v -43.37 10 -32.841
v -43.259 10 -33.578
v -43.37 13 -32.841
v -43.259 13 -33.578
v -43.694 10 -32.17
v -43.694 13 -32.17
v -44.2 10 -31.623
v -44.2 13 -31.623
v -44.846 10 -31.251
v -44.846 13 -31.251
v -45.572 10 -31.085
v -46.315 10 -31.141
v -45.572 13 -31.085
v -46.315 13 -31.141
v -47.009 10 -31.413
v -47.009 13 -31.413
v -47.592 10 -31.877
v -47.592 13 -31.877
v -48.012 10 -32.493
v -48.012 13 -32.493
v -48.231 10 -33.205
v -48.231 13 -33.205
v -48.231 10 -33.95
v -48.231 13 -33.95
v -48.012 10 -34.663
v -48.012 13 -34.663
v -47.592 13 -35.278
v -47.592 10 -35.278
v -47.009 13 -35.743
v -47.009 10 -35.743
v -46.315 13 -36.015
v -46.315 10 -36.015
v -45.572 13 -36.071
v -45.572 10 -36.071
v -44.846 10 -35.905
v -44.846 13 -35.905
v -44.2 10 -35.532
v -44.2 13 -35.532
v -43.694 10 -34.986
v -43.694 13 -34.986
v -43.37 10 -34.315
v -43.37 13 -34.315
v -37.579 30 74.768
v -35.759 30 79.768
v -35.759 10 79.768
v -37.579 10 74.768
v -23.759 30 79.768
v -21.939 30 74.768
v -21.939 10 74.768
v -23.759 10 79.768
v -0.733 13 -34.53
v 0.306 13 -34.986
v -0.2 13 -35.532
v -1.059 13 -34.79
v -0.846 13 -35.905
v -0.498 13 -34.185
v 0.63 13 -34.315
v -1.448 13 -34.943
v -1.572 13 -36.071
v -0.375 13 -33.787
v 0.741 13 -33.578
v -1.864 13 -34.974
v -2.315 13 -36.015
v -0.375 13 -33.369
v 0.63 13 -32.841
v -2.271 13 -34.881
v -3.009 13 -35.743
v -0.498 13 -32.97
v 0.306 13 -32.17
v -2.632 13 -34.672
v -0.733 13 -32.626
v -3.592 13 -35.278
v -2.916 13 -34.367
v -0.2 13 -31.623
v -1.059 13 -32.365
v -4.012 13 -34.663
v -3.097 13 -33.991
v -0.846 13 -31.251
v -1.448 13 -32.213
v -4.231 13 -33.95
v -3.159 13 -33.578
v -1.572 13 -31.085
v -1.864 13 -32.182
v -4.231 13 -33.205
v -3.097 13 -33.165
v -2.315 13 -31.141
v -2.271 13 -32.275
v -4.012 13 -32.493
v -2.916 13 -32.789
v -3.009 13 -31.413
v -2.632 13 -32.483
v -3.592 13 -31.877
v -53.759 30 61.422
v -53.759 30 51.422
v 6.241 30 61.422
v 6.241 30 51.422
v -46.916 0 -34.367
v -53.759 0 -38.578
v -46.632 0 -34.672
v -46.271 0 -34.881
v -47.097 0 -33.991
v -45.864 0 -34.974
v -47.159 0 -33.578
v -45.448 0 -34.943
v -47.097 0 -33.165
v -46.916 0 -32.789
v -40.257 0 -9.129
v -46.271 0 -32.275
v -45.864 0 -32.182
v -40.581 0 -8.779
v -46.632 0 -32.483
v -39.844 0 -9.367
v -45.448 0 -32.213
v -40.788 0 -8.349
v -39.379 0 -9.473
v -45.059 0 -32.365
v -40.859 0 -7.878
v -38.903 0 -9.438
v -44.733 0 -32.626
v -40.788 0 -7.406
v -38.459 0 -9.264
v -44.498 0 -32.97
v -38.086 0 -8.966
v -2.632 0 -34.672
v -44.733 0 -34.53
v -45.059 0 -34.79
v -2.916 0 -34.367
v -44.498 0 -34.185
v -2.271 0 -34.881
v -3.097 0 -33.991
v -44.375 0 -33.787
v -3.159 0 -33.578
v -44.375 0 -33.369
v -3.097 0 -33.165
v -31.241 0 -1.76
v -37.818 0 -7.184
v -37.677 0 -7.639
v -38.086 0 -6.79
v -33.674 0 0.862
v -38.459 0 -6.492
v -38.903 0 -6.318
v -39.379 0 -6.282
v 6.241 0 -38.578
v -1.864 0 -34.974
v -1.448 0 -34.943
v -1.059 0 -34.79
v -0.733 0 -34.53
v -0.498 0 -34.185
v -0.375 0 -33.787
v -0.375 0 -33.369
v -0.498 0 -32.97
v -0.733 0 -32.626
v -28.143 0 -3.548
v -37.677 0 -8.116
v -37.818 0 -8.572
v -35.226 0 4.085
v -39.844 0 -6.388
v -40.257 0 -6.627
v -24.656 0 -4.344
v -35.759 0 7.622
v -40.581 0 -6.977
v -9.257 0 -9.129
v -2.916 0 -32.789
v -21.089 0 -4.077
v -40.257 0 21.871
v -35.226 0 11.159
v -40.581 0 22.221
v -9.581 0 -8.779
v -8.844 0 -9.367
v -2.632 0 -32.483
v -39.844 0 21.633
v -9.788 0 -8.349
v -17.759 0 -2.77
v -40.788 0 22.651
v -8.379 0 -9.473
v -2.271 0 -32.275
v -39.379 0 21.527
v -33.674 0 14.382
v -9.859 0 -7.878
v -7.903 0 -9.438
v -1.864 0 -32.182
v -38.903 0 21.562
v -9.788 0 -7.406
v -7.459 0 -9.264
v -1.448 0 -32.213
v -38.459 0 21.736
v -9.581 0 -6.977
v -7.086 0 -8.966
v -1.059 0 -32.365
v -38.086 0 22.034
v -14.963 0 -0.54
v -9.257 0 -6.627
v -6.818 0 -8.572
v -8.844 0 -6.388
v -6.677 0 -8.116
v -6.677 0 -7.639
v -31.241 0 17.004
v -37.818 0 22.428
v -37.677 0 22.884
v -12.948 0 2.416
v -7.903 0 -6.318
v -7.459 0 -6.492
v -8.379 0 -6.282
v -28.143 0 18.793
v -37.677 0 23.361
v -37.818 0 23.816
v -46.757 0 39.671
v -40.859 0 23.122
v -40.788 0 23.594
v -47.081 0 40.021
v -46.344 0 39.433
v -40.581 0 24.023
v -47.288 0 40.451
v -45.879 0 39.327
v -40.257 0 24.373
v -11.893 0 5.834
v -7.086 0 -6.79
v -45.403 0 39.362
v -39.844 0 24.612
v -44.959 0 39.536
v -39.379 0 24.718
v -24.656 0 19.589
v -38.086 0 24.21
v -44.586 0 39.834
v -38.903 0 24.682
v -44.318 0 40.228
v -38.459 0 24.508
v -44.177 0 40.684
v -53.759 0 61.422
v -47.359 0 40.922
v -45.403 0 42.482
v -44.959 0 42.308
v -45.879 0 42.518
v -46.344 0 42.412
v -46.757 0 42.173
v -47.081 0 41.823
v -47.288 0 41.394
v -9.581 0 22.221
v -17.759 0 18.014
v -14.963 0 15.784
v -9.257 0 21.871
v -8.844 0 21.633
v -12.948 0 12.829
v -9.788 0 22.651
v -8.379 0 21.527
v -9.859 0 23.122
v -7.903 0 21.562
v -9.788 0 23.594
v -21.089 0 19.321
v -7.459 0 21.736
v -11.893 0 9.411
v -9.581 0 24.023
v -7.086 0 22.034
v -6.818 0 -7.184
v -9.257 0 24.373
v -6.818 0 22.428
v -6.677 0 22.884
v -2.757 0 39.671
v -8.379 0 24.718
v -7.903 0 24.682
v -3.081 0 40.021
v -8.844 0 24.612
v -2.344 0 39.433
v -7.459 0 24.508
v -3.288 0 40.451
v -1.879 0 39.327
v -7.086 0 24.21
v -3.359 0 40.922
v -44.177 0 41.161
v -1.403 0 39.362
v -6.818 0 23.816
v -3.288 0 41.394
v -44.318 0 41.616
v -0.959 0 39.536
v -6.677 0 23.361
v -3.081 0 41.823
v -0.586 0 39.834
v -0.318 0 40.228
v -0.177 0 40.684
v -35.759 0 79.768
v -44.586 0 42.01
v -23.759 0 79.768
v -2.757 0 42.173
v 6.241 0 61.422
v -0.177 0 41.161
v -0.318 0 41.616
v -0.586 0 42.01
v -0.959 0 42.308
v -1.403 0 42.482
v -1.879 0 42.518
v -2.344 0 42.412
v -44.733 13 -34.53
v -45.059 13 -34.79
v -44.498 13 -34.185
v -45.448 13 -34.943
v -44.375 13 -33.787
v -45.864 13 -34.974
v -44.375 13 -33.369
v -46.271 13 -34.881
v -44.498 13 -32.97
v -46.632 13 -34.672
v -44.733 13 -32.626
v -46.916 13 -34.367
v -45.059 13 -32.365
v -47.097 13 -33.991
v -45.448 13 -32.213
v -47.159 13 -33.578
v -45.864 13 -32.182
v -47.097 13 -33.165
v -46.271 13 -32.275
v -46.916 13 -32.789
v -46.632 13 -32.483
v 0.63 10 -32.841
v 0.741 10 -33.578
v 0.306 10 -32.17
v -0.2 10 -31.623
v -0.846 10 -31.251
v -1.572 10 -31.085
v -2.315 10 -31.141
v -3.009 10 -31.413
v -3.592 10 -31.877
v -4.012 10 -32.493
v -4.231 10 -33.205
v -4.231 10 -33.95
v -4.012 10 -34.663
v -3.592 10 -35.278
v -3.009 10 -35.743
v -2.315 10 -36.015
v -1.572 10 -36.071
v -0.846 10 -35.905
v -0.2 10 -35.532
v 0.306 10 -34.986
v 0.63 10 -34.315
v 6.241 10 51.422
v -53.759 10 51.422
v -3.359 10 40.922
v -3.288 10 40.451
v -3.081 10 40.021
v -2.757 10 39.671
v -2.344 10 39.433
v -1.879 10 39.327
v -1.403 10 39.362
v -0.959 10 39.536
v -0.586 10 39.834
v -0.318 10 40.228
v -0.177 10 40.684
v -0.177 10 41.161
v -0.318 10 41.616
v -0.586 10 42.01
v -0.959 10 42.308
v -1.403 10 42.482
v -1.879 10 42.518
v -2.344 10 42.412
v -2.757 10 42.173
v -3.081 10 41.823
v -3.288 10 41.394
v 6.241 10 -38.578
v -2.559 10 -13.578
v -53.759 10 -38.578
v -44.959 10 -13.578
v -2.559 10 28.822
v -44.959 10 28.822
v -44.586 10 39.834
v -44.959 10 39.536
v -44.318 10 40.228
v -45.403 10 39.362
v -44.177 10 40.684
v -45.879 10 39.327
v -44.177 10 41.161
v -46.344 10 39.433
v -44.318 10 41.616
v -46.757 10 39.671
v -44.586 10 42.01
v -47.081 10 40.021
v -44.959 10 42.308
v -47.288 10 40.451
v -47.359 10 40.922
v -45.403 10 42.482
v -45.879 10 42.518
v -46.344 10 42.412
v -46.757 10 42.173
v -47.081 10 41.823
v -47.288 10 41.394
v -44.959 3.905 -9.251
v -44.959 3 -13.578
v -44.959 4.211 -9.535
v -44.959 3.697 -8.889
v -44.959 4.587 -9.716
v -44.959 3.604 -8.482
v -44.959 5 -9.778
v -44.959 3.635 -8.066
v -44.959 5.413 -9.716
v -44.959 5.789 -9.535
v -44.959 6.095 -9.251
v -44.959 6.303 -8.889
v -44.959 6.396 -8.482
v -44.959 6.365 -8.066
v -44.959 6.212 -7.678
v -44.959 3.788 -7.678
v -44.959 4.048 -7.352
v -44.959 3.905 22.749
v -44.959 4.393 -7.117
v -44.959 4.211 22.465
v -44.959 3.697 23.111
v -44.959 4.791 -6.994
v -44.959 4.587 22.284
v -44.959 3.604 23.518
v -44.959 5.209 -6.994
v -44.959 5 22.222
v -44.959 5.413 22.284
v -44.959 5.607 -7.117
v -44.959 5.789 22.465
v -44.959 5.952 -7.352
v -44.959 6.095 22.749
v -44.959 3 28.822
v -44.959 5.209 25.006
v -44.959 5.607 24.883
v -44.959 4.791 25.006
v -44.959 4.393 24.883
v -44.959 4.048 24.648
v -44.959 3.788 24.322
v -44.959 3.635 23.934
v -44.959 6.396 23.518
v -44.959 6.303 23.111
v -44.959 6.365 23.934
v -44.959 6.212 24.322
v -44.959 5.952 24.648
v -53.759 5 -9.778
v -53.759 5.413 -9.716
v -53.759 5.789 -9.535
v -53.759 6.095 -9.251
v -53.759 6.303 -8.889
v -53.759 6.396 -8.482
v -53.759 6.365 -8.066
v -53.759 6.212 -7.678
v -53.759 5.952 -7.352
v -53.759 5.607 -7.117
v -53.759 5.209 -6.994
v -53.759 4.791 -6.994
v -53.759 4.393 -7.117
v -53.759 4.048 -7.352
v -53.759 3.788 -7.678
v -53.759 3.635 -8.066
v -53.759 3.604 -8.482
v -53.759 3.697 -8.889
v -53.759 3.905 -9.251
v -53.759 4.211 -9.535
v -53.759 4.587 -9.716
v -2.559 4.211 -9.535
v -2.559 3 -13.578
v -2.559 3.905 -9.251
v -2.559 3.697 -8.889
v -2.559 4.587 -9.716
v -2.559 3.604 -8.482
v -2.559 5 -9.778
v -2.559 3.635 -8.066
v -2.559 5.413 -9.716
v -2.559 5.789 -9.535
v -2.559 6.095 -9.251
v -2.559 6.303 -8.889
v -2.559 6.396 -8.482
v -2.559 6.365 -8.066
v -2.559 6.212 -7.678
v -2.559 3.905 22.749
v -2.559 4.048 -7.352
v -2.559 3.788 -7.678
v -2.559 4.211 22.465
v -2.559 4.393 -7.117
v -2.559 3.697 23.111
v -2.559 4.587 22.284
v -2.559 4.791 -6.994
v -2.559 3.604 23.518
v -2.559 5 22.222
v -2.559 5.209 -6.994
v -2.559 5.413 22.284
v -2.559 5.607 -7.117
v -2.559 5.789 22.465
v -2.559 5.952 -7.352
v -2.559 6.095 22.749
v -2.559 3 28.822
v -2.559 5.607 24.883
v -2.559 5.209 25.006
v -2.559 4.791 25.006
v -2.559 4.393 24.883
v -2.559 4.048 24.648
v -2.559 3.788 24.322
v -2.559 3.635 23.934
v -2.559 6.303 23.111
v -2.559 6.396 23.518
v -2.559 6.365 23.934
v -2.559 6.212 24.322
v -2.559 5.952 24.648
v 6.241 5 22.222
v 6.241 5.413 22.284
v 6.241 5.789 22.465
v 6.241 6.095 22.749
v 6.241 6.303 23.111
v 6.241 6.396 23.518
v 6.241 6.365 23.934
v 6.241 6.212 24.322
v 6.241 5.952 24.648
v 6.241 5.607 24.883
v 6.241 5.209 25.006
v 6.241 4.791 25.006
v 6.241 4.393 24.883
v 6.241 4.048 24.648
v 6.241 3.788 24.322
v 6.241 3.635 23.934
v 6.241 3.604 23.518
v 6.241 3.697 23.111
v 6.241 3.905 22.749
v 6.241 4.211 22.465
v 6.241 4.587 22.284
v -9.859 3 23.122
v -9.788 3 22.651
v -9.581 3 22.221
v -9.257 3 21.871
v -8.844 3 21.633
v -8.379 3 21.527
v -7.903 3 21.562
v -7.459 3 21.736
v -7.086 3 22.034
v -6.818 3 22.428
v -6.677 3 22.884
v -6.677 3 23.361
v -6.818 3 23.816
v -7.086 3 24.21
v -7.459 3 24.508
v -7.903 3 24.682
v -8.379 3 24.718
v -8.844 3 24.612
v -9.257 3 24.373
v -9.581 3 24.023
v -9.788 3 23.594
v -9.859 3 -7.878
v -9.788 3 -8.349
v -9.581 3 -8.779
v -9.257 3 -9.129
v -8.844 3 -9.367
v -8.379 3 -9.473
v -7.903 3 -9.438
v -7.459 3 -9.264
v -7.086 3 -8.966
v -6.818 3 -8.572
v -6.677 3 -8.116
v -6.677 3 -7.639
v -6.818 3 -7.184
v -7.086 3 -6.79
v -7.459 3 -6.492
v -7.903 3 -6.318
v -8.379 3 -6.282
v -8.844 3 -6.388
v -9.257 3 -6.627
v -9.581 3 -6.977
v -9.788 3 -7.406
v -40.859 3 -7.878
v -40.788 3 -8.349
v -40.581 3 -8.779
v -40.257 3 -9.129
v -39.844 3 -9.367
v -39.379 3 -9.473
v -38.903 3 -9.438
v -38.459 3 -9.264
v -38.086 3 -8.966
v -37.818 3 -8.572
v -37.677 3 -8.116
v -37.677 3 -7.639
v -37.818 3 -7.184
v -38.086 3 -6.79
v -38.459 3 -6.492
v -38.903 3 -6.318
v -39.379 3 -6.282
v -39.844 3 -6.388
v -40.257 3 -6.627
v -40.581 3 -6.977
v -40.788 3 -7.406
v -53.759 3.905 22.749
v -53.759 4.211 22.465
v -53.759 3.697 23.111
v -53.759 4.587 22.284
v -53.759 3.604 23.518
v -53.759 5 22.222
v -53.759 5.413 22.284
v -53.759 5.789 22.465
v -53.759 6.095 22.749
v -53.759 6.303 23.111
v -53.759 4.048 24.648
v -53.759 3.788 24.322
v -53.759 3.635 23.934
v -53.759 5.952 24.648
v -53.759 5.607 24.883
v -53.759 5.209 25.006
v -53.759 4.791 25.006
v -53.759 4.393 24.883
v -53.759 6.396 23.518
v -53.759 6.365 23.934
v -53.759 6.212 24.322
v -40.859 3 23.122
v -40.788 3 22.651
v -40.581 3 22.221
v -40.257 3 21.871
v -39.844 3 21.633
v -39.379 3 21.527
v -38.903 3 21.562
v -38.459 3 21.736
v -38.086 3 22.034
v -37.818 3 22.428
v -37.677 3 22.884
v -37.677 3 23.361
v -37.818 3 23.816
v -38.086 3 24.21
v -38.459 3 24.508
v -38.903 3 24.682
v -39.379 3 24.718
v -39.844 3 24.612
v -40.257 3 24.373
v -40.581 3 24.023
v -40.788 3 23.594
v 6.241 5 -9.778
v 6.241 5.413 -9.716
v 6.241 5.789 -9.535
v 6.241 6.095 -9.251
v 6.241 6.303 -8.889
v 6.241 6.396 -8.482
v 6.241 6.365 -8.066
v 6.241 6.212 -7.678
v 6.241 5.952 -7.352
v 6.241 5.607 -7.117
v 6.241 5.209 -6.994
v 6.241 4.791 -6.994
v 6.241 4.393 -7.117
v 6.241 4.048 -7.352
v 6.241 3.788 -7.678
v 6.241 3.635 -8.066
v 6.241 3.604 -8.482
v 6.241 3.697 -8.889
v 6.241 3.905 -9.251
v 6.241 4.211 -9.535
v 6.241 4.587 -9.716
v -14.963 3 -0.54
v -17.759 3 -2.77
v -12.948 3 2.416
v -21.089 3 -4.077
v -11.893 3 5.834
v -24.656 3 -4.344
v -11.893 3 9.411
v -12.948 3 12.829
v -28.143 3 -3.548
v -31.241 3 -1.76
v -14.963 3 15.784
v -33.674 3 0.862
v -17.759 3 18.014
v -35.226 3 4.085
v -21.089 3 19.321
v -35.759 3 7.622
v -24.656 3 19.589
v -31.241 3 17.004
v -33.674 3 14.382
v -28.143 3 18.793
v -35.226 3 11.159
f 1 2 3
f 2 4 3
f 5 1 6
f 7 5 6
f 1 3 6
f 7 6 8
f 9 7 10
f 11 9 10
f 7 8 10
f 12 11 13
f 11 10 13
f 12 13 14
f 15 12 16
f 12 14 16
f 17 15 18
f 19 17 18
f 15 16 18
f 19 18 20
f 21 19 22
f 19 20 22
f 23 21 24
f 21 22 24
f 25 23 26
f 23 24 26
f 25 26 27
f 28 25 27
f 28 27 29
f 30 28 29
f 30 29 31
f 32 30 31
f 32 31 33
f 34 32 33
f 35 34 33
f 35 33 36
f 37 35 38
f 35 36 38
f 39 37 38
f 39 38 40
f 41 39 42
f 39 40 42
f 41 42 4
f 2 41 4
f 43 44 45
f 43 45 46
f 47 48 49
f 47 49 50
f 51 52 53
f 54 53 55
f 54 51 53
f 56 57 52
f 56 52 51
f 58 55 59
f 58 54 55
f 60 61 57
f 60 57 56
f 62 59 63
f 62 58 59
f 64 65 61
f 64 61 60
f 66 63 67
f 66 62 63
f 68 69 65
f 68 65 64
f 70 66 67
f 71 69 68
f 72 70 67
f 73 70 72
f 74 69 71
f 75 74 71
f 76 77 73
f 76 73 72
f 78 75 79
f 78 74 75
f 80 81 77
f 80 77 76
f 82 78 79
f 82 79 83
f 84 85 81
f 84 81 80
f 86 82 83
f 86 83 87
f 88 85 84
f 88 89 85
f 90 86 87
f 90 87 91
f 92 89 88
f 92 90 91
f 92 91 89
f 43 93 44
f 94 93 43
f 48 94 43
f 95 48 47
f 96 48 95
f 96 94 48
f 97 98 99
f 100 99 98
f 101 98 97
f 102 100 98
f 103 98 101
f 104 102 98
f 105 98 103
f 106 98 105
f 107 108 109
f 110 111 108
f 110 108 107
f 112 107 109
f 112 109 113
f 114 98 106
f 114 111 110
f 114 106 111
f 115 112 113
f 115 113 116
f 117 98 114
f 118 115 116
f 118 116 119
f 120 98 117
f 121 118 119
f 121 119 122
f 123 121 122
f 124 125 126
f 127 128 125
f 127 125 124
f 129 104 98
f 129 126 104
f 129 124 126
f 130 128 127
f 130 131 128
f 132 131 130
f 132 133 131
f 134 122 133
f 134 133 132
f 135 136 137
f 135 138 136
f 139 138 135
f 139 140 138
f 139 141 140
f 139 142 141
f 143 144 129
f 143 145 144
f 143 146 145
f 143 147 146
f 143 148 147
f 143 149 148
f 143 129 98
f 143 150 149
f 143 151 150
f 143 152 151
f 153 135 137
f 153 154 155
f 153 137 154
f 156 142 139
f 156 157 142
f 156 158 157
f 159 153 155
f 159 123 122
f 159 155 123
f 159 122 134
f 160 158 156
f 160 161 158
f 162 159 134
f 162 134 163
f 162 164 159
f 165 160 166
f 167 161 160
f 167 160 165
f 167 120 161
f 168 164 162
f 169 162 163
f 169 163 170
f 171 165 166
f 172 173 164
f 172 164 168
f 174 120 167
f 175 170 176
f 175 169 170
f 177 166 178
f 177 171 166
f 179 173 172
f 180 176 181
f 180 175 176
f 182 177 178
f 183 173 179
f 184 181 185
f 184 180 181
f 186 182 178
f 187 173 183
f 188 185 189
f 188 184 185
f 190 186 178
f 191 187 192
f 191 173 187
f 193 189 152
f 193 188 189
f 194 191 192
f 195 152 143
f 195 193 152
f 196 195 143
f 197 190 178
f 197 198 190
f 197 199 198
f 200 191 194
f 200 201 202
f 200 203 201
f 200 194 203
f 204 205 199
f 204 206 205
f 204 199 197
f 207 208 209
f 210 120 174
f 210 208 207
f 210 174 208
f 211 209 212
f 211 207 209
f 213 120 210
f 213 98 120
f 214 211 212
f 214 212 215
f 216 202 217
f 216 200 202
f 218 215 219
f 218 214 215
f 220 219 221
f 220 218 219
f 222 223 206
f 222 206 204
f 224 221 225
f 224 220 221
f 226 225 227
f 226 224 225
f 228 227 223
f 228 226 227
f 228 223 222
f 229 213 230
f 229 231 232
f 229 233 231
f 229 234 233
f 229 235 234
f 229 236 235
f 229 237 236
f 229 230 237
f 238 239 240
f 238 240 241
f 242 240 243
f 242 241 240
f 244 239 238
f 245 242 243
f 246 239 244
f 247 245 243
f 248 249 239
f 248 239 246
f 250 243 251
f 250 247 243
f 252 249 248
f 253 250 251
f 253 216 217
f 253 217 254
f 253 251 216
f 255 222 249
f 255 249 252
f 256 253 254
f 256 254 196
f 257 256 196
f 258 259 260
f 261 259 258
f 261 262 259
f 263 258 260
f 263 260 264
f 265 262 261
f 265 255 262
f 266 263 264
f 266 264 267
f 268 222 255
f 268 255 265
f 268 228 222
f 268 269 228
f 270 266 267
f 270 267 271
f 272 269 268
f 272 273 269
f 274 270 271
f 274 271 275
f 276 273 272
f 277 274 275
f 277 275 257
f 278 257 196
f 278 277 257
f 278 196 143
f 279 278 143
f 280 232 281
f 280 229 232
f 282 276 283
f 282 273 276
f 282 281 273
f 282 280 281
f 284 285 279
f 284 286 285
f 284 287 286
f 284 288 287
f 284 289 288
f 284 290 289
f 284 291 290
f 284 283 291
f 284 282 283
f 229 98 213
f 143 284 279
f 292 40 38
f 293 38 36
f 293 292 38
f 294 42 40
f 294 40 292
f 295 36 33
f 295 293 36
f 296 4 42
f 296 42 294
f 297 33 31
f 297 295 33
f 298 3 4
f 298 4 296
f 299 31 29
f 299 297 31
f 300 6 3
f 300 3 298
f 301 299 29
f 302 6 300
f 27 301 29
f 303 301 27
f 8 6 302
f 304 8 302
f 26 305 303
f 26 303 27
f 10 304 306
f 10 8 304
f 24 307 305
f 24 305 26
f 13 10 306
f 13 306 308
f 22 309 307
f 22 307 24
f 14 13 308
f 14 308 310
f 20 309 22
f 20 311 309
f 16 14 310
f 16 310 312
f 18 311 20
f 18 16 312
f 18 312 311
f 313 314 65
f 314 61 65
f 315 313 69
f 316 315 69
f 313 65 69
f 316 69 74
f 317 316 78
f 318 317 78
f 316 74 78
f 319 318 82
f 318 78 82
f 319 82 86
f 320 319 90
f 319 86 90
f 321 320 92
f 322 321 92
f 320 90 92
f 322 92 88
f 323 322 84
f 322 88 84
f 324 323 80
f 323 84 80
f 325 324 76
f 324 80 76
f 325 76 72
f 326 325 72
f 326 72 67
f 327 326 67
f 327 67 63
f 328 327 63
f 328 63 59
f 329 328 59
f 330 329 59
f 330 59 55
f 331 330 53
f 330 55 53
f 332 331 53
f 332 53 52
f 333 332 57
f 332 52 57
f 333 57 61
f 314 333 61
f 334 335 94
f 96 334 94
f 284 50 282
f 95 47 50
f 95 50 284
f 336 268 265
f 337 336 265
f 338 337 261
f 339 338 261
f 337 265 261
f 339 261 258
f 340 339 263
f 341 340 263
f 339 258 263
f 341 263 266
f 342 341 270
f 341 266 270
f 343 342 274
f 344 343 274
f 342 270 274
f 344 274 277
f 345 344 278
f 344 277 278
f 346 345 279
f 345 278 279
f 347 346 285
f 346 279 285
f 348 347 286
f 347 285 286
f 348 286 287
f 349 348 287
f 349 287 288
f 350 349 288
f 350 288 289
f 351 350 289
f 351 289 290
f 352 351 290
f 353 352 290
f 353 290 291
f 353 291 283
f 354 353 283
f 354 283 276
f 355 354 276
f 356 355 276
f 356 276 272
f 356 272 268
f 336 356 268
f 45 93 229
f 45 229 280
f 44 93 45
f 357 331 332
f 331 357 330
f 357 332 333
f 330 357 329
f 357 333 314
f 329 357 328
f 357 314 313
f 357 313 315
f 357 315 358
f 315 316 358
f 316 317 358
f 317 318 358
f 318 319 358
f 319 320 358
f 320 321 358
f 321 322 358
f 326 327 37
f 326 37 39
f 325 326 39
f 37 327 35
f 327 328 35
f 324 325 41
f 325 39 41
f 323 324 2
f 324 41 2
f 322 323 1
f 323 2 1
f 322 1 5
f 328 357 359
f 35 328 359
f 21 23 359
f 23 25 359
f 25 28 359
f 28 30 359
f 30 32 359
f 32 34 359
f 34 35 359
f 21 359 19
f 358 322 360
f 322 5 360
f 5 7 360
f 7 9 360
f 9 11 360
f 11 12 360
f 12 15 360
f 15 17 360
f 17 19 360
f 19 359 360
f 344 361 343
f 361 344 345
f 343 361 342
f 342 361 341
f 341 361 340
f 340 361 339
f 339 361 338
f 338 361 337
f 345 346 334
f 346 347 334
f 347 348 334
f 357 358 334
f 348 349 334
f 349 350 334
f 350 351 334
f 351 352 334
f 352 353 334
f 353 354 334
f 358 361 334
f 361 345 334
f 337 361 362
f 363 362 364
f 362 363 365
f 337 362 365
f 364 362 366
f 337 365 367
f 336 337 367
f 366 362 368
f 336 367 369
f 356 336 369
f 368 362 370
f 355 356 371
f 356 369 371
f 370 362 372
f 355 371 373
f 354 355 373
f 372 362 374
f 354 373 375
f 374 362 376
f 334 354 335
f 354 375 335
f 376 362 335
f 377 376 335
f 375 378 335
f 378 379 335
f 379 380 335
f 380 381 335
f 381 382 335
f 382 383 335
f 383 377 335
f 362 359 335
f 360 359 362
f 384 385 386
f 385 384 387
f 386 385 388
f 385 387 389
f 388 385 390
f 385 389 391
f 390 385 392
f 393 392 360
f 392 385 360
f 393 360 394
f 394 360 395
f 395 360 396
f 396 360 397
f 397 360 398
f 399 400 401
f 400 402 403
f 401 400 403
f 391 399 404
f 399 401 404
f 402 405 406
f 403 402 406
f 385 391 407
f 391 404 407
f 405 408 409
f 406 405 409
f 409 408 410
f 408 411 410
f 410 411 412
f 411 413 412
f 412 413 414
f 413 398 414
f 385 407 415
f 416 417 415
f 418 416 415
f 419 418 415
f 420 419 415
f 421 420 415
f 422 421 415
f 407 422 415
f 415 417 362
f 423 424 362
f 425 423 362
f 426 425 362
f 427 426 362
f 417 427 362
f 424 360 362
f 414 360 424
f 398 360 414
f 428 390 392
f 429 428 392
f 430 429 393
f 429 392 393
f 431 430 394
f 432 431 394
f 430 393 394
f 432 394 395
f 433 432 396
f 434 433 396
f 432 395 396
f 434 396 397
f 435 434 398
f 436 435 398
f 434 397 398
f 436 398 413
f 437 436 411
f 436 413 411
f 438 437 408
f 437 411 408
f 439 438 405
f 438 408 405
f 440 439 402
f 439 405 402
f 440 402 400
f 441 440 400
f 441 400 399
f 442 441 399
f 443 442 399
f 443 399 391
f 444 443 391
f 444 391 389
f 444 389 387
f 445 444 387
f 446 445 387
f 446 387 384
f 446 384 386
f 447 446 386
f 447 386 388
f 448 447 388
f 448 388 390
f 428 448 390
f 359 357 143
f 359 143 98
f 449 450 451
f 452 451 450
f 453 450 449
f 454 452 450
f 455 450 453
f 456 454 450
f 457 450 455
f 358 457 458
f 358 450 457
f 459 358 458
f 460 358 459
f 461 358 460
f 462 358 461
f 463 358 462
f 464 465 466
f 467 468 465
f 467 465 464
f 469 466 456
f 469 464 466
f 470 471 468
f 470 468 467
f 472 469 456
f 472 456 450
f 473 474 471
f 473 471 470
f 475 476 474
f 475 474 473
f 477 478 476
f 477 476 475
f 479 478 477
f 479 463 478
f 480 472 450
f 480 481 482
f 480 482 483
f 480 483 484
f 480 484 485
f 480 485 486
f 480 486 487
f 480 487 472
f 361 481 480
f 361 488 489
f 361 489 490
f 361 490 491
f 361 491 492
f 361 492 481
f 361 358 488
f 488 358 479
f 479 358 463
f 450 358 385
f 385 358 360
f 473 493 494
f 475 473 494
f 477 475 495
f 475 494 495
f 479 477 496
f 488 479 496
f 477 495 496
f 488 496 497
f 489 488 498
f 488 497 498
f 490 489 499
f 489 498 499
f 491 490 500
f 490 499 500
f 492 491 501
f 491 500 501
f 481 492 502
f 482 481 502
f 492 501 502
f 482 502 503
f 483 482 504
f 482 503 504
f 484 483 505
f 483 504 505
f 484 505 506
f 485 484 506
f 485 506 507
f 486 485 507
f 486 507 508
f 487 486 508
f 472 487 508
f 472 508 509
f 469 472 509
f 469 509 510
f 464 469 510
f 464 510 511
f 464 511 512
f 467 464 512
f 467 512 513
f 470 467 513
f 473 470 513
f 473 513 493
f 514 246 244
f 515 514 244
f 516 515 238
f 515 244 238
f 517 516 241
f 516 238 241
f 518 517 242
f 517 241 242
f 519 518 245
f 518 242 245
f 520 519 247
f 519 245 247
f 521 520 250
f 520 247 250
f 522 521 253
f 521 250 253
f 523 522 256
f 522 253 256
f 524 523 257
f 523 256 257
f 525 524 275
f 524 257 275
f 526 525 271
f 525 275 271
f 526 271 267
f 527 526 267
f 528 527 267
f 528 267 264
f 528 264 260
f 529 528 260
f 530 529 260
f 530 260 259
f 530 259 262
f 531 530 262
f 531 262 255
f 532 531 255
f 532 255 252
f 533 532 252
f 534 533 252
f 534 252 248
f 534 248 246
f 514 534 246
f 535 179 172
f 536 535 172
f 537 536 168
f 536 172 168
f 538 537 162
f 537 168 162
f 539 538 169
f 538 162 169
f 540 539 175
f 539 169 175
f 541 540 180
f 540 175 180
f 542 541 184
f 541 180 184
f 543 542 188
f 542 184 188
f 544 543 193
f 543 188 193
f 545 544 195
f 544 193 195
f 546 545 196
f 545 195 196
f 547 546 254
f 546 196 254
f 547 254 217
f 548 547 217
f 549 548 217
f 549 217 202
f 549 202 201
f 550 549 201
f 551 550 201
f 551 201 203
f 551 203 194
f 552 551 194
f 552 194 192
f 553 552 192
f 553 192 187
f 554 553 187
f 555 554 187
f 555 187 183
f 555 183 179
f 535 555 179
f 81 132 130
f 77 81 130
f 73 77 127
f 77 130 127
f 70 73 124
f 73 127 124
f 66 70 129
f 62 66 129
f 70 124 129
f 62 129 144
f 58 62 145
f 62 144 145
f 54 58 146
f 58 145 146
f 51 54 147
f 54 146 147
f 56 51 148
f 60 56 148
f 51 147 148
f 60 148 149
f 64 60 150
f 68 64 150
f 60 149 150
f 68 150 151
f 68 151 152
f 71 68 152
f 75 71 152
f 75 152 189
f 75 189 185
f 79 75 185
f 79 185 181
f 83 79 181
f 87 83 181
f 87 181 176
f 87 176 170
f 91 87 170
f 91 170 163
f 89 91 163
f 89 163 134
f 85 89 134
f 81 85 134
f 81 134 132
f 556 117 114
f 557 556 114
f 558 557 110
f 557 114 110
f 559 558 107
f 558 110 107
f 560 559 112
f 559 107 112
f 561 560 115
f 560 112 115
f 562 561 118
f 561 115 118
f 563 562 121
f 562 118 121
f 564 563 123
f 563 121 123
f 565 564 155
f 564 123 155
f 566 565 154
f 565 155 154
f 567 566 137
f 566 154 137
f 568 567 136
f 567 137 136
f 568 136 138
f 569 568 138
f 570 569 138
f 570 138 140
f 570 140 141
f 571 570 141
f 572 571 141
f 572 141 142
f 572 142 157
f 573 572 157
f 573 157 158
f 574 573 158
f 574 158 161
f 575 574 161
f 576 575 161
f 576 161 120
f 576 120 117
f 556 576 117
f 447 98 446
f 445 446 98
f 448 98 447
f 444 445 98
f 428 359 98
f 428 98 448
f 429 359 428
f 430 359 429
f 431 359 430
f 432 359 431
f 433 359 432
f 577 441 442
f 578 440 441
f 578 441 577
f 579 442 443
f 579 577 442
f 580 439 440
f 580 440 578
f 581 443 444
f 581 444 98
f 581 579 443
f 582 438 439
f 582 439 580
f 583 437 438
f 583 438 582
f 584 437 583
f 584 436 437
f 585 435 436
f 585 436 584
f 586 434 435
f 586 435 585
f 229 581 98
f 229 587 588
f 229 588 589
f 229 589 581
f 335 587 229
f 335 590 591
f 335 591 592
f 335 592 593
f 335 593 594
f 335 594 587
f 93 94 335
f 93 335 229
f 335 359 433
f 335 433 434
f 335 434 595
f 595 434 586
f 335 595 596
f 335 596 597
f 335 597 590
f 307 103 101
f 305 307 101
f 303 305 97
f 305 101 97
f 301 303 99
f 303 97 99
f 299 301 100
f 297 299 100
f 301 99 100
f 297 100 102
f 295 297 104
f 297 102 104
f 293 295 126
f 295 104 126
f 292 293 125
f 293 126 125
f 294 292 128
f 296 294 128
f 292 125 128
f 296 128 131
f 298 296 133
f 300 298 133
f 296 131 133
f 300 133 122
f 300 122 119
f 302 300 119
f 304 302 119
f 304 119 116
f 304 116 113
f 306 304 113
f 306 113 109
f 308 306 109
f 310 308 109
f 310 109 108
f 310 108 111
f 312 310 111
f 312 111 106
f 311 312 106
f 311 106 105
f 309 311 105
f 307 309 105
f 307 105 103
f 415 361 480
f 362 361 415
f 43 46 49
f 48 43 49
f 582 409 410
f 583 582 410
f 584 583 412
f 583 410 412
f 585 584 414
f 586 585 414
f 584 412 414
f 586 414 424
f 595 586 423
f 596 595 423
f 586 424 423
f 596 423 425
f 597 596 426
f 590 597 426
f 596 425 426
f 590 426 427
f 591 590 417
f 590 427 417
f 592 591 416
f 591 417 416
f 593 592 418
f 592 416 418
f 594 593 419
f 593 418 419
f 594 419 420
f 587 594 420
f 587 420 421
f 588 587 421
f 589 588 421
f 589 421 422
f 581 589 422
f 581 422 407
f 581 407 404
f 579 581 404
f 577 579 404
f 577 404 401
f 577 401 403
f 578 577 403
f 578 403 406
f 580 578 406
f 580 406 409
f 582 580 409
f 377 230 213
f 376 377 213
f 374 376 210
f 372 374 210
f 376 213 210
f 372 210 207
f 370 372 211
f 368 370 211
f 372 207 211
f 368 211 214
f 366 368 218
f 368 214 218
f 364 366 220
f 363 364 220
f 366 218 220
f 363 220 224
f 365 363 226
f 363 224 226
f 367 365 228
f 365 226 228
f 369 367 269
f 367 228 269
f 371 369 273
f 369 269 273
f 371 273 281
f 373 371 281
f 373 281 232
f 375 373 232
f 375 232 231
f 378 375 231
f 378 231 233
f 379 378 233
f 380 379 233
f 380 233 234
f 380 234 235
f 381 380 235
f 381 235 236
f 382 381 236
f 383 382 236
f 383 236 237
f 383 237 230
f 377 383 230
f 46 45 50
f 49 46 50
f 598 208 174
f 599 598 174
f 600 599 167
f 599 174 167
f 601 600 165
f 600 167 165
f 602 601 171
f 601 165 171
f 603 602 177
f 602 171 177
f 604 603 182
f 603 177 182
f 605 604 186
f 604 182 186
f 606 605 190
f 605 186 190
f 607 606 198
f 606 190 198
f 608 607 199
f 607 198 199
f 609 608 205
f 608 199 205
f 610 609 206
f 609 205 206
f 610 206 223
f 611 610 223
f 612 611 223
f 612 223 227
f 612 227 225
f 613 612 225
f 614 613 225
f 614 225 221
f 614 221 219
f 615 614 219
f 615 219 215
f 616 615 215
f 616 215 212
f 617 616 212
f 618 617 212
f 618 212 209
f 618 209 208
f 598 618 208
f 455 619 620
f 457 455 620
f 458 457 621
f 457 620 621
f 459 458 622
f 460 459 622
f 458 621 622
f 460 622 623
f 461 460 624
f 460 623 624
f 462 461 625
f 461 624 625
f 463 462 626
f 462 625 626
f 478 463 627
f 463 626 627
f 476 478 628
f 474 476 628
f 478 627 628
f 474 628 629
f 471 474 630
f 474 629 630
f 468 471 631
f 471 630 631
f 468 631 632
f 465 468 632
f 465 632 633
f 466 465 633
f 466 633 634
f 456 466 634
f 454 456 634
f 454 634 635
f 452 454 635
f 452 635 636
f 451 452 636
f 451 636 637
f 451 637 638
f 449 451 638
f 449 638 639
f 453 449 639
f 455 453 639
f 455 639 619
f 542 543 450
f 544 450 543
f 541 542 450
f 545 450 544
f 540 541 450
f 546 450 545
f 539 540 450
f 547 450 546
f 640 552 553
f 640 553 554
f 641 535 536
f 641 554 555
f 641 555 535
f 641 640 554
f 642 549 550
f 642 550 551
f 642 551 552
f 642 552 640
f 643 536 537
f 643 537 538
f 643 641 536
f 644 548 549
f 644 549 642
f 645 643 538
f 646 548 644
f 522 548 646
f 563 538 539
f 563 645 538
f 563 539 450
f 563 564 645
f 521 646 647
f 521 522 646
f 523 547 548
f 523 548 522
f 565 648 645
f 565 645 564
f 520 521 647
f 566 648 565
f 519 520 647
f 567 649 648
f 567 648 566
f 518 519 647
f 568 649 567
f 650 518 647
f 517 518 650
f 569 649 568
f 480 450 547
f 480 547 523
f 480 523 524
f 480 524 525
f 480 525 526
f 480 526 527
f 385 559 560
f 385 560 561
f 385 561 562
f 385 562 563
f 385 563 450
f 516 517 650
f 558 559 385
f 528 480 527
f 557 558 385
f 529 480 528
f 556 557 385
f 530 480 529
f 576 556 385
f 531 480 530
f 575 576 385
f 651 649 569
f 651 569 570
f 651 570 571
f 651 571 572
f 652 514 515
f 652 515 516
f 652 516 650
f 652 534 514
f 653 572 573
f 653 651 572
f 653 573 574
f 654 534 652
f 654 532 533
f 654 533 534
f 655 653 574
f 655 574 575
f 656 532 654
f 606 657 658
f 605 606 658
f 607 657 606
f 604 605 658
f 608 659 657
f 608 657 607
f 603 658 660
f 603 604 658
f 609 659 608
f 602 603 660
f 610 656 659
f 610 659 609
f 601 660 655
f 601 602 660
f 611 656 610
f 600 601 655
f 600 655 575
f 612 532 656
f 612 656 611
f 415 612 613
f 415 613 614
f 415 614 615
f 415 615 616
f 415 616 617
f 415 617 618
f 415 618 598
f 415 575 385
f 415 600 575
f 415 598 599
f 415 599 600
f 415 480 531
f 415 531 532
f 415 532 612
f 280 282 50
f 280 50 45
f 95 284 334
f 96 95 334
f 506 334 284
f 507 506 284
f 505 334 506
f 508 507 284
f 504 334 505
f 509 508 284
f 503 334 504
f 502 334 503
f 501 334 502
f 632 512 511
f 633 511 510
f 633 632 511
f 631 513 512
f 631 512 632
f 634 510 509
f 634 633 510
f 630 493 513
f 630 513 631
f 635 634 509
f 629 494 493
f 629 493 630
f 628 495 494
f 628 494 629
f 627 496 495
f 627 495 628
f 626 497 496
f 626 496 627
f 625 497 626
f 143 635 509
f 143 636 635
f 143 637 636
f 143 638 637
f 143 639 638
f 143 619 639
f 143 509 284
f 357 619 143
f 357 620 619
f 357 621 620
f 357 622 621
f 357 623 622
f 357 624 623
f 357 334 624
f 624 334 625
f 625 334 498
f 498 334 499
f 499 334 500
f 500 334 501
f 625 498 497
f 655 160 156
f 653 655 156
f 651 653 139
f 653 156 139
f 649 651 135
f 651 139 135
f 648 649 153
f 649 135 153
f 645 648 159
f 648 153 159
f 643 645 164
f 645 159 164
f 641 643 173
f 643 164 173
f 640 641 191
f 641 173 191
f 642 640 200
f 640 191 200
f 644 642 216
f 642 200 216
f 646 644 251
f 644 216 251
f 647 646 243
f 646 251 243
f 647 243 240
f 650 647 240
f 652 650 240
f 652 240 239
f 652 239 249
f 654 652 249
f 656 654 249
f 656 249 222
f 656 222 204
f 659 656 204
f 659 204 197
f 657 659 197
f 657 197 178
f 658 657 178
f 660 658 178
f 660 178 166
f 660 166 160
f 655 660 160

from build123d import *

# Parameters (mm, degrees)
EXTRUDE_1_DEPTH             = 30
SKETCH_2_W                  = 90
SKETCH_2_H                  = 20
CUT_EXTRUDE_1_DEPTH         = 61
SKETCH_3_W                  = 42.4
SKETCH_3_H                  = 42.4
CUT_EXTRUDE_2_DEPTH         = 7
SKETCH_4_W                  = 2.5
SKETCH_4_H                  = 3
SKETCH_5_W                  = 2.5
SKETCH_5_H                  = 3
HOLE_WIZARD_24_0_24_1_D     = 24
HOLE_WIZARD_24_0_24_1_DEPTH = 3
HOLE_WIZARD_3_2_3_2_1_D     = 3.2
HOLE_WIZARD_3_2_3_2_1_DEPTH = 3
HOLE_WIZARD_2_8_2_8_1_D     = 2.8
HOLE_WIZARD_2_8_2_8_1_DEPTH = 13
HOLE_WIZARD_3_2_3_2_2_D     = 3.2
HOLE_WIZARD_3_2_3_2_2_DEPTH = 10
HOLE_WIZARD_2_8_2_8_2_D     = 2.8
HOLE_WIZARD_2_8_2_8_2_DEPTH = 8.8
HOLE_WIZARD_2_8_2_8_3_D     = 2.8
HOLE_WIZARD_2_8_2_8_3_DEPTH = 8.8
EXTRUDE_2_DEPTH             = 10


with BuildPart() as part:
    # 草图1 → 凸台-拉伸1 (new body)
    with BuildSketch(Plane(origin=(0, 30, 0), x_dir=(1, 0, 0), z_dir=(0, 1, 0))):
        Polygon((-53.759164819, 38.577872891), (-53.759164819, -61.422127109), (-35.759164819, -79.767511878), (-37.57901599, -74.767511878), (-21.939313647, -74.767511878), (-23.759164819, -79.767511878), (6.240835181, -61.422127109), (6.240835181, 38.577872891), align=None)
    extrude(amount=-EXTRUDE_1_DEPTH)

    # 草图2 → 切除-拉伸1 (cut, through all)
    with BuildSketch(Plane.ZY.offset(53.759164819)):
        with Locations((6.422127109, 20)):
            Rectangle(SKETCH_2_W, SKETCH_2_H)
    extrude(amount=-CUT_EXTRUDE_1_DEPTH, mode=Mode.SUBTRACT)

    # 草图3 → 切除-拉伸2 (cut)
    with BuildSketch(Plane(origin=(0, 10, 0), x_dir=(-1, 0, 0), z_dir=(0, 1, 0))):
        with Locations((23.759164819, 7.622127109)):
            Rectangle(SKETCH_3_W, SKETCH_3_H)
    extrude(amount=-CUT_EXTRUDE_2_DEPTH, mode=Mode.SUBTRACT)

    # 草图4 → 旋转1 (revolve)
    with BuildSketch(Plane.XY.offset(-33.577872891)):
        with Locations((-44.509164819, 11.5)):
            Rectangle(SKETCH_4_W, SKETCH_4_H)
    revolve(axis=Axis((-45.759164819, 13, -33.577872891), (0, -1, 0)))

    # 草图5 → 旋转2 (revolve)
    with BuildSketch(Plane.XY.offset(-33.577872891)):
        with Locations((-0.509164819, 11.5)):
            Rectangle(SKETCH_5_W, SKETCH_5_H)
    revolve(axis=Axis((-1.759164819, 13, -33.577872891), (0, -1, 0)))

    # Ø24.0 (24) 直径孔1
    with Locations(Plane(origin=(0, 3, 0), x_dir=(1, 0, 0), z_dir=(0, 1, 0))):
        with Locations((-23.759164819, -7.622127109)):
            Hole(HOLE_WIZARD_24_0_24_1_D / 2, depth=HOLE_WIZARD_24_0_24_1_DEPTH)

    # Ø3.2 (3.2) 直径孔1
    with Locations(Plane(origin=(0, 3, 0), x_dir=(1, 0, 0), z_dir=(0, 1, 0))):
        with Locations((-8.259164819, -23.122127109), (-39.259164819, 7.877872891), (-8.259164819, 7.877872891), (-39.259164819, -23.122127109)):
            Hole(HOLE_WIZARD_3_2_3_2_1_D / 2, depth=HOLE_WIZARD_3_2_3_2_1_DEPTH)

    # Ø2.8 (2.8) 直径孔1
    with Locations(Plane(origin=(0, 13, 0), x_dir=(1, 0, 0), z_dir=(0, 1, 0))):
        with Locations((-45.759164819, 33.577872891), (-1.759164819, 33.577872891)):
            Hole(HOLE_WIZARD_2_8_2_8_1_D / 2, depth=HOLE_WIZARD_2_8_2_8_1_DEPTH)

    # Ø3.2 (3.2) 直径孔2
    with Locations(Plane(origin=(0, 10, 0), x_dir=(1, 0, 0), z_dir=(0, 1, 0))):
        with Locations((-45.759164819, -40.922127109), (-1.759164819, -40.922127109)):
            Hole(HOLE_WIZARD_3_2_3_2_2_D / 2, depth=HOLE_WIZARD_3_2_3_2_2_DEPTH)

    # Ø2.8 (2.8) 直径孔2
    with Locations(Plane.ZY.offset(53.759164819)):
        with Locations((-8.377872891, 5), (23.622127109, 5)):
            Hole(HOLE_WIZARD_2_8_2_8_2_D / 2, depth=HOLE_WIZARD_2_8_2_8_2_DEPTH)

    # Ø2.8 (2.8) 直径孔3
    with Locations(Plane.ZY.offset(2.559164819)):
        with Locations((-8.377872891, 5), (23.622127109, 5)):
            Hole(HOLE_WIZARD_2_8_2_8_3_D / 2, depth=HOLE_WIZARD_2_8_2_8_3_DEPTH)

    # 草图18 → 凸台-拉伸2 (add)
    with BuildSketch(Plane.XZ):
        Polygon((-35.759164819, 79.767511878), (-37.57901599, 74.767511878), (-21.939313647, 74.767511878), (-23.759164819, 79.767511878), align=None)
    extrude(amount=-EXTRUDE_2_DEPTH)


solid = part.part
